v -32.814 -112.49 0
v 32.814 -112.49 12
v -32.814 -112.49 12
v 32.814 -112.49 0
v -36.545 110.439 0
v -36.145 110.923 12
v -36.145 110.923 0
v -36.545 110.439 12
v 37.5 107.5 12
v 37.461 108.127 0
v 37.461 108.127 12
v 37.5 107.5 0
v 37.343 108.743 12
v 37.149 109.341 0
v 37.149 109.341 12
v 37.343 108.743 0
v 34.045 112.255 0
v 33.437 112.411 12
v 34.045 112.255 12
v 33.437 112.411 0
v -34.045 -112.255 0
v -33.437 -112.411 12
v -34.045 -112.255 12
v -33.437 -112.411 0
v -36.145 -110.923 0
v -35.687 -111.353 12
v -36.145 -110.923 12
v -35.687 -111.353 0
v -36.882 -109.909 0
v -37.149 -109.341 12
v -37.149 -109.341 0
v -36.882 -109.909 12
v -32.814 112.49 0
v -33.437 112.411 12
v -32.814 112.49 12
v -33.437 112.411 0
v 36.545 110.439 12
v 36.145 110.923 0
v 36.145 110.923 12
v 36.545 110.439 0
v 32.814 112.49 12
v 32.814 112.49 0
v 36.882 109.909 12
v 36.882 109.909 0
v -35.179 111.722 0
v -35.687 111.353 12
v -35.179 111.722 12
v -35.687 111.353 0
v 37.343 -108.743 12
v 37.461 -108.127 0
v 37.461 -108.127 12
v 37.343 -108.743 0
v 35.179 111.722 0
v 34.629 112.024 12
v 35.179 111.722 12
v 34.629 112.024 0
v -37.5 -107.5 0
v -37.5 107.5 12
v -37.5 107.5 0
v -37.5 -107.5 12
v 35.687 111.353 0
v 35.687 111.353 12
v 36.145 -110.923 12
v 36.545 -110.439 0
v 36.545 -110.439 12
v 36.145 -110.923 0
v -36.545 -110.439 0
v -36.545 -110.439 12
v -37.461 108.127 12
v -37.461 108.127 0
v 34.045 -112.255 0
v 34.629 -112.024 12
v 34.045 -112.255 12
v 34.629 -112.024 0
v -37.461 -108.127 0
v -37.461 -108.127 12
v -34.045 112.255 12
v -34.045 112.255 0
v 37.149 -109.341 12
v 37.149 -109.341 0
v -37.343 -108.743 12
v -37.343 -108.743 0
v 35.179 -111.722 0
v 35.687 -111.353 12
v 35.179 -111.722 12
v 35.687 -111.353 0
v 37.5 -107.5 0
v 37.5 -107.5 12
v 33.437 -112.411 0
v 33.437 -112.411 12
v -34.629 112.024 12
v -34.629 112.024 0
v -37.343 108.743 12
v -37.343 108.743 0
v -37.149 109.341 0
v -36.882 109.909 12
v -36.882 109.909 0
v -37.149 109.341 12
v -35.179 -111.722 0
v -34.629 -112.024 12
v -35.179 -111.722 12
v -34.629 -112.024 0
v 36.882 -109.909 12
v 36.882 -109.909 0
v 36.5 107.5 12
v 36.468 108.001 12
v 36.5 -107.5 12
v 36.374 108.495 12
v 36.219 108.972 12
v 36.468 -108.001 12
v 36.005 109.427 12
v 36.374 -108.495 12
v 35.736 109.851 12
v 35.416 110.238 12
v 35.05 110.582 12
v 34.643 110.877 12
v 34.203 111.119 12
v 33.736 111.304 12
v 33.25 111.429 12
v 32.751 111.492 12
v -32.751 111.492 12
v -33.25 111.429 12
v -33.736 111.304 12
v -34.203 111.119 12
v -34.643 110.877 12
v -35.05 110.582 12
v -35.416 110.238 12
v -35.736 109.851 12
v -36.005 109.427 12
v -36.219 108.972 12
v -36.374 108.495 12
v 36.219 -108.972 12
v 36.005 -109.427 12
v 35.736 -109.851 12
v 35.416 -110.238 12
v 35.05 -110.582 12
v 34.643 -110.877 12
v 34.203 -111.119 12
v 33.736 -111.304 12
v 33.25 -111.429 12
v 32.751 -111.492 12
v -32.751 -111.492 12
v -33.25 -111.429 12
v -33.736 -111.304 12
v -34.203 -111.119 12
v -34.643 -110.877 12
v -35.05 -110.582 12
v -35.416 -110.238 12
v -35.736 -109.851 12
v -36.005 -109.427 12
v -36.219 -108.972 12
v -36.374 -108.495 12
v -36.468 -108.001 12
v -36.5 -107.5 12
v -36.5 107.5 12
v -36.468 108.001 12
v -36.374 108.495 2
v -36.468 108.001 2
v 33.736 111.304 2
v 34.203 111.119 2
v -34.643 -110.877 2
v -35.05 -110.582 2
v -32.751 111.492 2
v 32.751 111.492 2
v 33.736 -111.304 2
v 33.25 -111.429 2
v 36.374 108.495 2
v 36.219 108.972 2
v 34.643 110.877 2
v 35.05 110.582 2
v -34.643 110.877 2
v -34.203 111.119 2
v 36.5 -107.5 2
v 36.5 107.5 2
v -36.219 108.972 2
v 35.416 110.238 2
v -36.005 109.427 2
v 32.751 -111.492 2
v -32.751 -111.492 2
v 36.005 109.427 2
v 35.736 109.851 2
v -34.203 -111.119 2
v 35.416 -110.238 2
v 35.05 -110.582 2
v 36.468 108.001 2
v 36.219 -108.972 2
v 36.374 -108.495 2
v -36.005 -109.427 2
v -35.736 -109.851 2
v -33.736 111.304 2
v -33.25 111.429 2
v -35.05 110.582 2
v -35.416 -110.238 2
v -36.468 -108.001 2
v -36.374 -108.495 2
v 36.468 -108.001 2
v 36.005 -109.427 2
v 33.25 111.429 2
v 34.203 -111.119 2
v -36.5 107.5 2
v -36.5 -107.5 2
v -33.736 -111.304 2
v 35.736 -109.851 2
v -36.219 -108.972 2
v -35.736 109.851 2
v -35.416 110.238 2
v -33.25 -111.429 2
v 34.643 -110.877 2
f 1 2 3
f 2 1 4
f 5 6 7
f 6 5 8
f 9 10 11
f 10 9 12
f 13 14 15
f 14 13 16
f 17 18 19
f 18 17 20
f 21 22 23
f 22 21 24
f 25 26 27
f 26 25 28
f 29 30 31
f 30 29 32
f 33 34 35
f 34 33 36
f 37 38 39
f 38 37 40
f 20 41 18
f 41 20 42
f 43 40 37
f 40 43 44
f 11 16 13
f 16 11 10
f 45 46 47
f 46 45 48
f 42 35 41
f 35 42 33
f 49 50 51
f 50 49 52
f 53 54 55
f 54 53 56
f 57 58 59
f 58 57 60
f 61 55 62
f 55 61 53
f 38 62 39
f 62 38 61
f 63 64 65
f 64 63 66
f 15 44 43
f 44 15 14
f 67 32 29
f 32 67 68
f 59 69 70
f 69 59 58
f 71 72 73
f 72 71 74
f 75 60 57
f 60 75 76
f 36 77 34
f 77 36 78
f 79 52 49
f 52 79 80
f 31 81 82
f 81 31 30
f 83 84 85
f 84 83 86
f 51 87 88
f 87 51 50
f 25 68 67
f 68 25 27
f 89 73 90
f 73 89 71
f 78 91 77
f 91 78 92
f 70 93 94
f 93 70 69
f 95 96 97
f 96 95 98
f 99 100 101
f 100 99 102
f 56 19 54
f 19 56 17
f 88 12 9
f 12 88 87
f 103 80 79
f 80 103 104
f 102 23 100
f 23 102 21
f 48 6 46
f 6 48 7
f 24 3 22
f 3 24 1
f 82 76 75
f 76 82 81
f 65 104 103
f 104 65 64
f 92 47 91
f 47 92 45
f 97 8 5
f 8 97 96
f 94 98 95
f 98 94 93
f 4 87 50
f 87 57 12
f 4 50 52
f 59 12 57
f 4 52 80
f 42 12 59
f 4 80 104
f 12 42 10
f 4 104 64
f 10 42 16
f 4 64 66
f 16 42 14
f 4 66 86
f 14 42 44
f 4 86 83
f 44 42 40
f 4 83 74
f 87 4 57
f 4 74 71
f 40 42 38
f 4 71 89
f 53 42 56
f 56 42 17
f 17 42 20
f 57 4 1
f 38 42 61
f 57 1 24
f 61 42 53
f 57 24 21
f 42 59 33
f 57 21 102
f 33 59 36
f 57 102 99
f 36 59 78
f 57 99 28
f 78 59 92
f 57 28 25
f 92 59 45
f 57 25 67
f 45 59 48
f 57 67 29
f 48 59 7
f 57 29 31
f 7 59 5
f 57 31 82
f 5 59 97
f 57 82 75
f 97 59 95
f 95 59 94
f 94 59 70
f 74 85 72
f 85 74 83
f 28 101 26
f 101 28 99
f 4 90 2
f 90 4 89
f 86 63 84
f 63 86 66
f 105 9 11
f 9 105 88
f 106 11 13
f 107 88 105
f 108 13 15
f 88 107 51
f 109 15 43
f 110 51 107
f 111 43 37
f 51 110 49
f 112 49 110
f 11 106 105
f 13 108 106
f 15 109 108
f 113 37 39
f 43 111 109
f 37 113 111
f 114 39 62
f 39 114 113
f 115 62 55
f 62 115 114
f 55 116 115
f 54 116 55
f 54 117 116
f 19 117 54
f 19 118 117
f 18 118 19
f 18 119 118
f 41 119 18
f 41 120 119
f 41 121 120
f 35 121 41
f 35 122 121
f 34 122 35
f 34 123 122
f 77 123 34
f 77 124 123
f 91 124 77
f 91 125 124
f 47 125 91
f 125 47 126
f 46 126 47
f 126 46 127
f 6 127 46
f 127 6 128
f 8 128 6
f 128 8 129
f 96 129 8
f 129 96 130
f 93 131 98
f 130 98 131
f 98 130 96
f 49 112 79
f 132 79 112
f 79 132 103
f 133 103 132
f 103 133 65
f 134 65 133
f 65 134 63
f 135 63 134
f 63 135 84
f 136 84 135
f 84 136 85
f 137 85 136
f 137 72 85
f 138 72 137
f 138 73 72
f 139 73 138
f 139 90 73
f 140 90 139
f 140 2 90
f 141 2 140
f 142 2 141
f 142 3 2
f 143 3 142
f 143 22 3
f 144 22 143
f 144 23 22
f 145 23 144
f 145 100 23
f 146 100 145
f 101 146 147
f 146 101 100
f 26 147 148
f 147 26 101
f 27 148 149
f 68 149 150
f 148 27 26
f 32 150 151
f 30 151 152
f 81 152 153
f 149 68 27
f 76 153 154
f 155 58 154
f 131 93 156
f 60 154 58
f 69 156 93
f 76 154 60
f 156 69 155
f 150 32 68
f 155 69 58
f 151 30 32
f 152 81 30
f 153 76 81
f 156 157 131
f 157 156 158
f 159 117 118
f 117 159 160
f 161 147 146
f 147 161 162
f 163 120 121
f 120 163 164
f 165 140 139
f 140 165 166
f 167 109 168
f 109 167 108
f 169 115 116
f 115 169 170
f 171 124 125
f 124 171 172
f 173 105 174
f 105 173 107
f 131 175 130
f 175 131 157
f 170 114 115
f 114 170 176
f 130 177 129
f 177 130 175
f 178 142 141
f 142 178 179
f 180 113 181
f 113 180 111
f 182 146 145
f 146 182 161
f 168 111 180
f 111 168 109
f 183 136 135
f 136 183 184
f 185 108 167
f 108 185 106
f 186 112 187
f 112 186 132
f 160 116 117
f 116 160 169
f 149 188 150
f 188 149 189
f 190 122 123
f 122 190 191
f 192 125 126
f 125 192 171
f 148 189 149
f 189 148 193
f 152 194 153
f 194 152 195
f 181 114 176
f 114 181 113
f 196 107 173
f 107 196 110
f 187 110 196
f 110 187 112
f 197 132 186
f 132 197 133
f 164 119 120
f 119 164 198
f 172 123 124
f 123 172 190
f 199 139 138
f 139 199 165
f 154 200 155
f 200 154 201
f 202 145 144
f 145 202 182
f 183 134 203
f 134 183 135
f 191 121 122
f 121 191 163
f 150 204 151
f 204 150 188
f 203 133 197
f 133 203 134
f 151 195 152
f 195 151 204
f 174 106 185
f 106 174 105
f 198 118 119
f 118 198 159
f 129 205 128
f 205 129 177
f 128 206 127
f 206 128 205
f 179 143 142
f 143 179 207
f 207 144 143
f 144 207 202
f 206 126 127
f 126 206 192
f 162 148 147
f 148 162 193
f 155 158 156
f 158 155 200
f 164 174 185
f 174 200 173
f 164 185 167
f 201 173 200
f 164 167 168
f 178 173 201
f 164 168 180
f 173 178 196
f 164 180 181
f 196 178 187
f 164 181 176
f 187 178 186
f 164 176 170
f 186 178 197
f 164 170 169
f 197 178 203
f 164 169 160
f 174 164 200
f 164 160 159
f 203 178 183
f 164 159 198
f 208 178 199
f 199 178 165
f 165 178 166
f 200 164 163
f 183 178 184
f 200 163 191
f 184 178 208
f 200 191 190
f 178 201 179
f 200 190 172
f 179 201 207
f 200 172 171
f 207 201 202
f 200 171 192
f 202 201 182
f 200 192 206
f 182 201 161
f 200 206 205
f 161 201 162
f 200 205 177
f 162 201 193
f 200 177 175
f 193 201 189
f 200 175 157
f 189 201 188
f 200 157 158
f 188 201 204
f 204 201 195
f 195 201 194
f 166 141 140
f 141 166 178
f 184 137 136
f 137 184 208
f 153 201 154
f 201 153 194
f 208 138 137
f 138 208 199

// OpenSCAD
$fn = 50;


difference() {
	union() {
		hull() {
			translate(v = [-32.5000000000, 107.5000000000, 0]) {
				cylinder(h = 12, r = 5);
			}
			translate(v = [32.5000000000, 107.5000000000, 0]) {
				cylinder(h = 12, r = 5);
			}
			translate(v = [-32.5000000000, -107.5000000000, 0]) {
				cylinder(h = 12, r = 5);
			}
			translate(v = [32.5000000000, -107.5000000000, 0]) {
				cylinder(h = 12, r = 5);
			}
		}
	}
	union() {
		translate(v = [0, 0, 2]) {
			hull() {
				translate(v = [-32.5000000000, 107.5000000000, 0]) {
					cylinder(h = 10, r = 4);
				}
				translate(v = [32.5000000000, 107.5000000000, 0]) {
					cylinder(h = 10, r = 4);
				}
				translate(v = [-32.5000000000, -107.5000000000, 0]) {
					cylinder(h = 10, r = 4);
				}
				translate(v = [32.5000000000, -107.5000000000, 0]) {
					cylinder(h = 10, r = 4);
				}
			}
		}
	}
}
